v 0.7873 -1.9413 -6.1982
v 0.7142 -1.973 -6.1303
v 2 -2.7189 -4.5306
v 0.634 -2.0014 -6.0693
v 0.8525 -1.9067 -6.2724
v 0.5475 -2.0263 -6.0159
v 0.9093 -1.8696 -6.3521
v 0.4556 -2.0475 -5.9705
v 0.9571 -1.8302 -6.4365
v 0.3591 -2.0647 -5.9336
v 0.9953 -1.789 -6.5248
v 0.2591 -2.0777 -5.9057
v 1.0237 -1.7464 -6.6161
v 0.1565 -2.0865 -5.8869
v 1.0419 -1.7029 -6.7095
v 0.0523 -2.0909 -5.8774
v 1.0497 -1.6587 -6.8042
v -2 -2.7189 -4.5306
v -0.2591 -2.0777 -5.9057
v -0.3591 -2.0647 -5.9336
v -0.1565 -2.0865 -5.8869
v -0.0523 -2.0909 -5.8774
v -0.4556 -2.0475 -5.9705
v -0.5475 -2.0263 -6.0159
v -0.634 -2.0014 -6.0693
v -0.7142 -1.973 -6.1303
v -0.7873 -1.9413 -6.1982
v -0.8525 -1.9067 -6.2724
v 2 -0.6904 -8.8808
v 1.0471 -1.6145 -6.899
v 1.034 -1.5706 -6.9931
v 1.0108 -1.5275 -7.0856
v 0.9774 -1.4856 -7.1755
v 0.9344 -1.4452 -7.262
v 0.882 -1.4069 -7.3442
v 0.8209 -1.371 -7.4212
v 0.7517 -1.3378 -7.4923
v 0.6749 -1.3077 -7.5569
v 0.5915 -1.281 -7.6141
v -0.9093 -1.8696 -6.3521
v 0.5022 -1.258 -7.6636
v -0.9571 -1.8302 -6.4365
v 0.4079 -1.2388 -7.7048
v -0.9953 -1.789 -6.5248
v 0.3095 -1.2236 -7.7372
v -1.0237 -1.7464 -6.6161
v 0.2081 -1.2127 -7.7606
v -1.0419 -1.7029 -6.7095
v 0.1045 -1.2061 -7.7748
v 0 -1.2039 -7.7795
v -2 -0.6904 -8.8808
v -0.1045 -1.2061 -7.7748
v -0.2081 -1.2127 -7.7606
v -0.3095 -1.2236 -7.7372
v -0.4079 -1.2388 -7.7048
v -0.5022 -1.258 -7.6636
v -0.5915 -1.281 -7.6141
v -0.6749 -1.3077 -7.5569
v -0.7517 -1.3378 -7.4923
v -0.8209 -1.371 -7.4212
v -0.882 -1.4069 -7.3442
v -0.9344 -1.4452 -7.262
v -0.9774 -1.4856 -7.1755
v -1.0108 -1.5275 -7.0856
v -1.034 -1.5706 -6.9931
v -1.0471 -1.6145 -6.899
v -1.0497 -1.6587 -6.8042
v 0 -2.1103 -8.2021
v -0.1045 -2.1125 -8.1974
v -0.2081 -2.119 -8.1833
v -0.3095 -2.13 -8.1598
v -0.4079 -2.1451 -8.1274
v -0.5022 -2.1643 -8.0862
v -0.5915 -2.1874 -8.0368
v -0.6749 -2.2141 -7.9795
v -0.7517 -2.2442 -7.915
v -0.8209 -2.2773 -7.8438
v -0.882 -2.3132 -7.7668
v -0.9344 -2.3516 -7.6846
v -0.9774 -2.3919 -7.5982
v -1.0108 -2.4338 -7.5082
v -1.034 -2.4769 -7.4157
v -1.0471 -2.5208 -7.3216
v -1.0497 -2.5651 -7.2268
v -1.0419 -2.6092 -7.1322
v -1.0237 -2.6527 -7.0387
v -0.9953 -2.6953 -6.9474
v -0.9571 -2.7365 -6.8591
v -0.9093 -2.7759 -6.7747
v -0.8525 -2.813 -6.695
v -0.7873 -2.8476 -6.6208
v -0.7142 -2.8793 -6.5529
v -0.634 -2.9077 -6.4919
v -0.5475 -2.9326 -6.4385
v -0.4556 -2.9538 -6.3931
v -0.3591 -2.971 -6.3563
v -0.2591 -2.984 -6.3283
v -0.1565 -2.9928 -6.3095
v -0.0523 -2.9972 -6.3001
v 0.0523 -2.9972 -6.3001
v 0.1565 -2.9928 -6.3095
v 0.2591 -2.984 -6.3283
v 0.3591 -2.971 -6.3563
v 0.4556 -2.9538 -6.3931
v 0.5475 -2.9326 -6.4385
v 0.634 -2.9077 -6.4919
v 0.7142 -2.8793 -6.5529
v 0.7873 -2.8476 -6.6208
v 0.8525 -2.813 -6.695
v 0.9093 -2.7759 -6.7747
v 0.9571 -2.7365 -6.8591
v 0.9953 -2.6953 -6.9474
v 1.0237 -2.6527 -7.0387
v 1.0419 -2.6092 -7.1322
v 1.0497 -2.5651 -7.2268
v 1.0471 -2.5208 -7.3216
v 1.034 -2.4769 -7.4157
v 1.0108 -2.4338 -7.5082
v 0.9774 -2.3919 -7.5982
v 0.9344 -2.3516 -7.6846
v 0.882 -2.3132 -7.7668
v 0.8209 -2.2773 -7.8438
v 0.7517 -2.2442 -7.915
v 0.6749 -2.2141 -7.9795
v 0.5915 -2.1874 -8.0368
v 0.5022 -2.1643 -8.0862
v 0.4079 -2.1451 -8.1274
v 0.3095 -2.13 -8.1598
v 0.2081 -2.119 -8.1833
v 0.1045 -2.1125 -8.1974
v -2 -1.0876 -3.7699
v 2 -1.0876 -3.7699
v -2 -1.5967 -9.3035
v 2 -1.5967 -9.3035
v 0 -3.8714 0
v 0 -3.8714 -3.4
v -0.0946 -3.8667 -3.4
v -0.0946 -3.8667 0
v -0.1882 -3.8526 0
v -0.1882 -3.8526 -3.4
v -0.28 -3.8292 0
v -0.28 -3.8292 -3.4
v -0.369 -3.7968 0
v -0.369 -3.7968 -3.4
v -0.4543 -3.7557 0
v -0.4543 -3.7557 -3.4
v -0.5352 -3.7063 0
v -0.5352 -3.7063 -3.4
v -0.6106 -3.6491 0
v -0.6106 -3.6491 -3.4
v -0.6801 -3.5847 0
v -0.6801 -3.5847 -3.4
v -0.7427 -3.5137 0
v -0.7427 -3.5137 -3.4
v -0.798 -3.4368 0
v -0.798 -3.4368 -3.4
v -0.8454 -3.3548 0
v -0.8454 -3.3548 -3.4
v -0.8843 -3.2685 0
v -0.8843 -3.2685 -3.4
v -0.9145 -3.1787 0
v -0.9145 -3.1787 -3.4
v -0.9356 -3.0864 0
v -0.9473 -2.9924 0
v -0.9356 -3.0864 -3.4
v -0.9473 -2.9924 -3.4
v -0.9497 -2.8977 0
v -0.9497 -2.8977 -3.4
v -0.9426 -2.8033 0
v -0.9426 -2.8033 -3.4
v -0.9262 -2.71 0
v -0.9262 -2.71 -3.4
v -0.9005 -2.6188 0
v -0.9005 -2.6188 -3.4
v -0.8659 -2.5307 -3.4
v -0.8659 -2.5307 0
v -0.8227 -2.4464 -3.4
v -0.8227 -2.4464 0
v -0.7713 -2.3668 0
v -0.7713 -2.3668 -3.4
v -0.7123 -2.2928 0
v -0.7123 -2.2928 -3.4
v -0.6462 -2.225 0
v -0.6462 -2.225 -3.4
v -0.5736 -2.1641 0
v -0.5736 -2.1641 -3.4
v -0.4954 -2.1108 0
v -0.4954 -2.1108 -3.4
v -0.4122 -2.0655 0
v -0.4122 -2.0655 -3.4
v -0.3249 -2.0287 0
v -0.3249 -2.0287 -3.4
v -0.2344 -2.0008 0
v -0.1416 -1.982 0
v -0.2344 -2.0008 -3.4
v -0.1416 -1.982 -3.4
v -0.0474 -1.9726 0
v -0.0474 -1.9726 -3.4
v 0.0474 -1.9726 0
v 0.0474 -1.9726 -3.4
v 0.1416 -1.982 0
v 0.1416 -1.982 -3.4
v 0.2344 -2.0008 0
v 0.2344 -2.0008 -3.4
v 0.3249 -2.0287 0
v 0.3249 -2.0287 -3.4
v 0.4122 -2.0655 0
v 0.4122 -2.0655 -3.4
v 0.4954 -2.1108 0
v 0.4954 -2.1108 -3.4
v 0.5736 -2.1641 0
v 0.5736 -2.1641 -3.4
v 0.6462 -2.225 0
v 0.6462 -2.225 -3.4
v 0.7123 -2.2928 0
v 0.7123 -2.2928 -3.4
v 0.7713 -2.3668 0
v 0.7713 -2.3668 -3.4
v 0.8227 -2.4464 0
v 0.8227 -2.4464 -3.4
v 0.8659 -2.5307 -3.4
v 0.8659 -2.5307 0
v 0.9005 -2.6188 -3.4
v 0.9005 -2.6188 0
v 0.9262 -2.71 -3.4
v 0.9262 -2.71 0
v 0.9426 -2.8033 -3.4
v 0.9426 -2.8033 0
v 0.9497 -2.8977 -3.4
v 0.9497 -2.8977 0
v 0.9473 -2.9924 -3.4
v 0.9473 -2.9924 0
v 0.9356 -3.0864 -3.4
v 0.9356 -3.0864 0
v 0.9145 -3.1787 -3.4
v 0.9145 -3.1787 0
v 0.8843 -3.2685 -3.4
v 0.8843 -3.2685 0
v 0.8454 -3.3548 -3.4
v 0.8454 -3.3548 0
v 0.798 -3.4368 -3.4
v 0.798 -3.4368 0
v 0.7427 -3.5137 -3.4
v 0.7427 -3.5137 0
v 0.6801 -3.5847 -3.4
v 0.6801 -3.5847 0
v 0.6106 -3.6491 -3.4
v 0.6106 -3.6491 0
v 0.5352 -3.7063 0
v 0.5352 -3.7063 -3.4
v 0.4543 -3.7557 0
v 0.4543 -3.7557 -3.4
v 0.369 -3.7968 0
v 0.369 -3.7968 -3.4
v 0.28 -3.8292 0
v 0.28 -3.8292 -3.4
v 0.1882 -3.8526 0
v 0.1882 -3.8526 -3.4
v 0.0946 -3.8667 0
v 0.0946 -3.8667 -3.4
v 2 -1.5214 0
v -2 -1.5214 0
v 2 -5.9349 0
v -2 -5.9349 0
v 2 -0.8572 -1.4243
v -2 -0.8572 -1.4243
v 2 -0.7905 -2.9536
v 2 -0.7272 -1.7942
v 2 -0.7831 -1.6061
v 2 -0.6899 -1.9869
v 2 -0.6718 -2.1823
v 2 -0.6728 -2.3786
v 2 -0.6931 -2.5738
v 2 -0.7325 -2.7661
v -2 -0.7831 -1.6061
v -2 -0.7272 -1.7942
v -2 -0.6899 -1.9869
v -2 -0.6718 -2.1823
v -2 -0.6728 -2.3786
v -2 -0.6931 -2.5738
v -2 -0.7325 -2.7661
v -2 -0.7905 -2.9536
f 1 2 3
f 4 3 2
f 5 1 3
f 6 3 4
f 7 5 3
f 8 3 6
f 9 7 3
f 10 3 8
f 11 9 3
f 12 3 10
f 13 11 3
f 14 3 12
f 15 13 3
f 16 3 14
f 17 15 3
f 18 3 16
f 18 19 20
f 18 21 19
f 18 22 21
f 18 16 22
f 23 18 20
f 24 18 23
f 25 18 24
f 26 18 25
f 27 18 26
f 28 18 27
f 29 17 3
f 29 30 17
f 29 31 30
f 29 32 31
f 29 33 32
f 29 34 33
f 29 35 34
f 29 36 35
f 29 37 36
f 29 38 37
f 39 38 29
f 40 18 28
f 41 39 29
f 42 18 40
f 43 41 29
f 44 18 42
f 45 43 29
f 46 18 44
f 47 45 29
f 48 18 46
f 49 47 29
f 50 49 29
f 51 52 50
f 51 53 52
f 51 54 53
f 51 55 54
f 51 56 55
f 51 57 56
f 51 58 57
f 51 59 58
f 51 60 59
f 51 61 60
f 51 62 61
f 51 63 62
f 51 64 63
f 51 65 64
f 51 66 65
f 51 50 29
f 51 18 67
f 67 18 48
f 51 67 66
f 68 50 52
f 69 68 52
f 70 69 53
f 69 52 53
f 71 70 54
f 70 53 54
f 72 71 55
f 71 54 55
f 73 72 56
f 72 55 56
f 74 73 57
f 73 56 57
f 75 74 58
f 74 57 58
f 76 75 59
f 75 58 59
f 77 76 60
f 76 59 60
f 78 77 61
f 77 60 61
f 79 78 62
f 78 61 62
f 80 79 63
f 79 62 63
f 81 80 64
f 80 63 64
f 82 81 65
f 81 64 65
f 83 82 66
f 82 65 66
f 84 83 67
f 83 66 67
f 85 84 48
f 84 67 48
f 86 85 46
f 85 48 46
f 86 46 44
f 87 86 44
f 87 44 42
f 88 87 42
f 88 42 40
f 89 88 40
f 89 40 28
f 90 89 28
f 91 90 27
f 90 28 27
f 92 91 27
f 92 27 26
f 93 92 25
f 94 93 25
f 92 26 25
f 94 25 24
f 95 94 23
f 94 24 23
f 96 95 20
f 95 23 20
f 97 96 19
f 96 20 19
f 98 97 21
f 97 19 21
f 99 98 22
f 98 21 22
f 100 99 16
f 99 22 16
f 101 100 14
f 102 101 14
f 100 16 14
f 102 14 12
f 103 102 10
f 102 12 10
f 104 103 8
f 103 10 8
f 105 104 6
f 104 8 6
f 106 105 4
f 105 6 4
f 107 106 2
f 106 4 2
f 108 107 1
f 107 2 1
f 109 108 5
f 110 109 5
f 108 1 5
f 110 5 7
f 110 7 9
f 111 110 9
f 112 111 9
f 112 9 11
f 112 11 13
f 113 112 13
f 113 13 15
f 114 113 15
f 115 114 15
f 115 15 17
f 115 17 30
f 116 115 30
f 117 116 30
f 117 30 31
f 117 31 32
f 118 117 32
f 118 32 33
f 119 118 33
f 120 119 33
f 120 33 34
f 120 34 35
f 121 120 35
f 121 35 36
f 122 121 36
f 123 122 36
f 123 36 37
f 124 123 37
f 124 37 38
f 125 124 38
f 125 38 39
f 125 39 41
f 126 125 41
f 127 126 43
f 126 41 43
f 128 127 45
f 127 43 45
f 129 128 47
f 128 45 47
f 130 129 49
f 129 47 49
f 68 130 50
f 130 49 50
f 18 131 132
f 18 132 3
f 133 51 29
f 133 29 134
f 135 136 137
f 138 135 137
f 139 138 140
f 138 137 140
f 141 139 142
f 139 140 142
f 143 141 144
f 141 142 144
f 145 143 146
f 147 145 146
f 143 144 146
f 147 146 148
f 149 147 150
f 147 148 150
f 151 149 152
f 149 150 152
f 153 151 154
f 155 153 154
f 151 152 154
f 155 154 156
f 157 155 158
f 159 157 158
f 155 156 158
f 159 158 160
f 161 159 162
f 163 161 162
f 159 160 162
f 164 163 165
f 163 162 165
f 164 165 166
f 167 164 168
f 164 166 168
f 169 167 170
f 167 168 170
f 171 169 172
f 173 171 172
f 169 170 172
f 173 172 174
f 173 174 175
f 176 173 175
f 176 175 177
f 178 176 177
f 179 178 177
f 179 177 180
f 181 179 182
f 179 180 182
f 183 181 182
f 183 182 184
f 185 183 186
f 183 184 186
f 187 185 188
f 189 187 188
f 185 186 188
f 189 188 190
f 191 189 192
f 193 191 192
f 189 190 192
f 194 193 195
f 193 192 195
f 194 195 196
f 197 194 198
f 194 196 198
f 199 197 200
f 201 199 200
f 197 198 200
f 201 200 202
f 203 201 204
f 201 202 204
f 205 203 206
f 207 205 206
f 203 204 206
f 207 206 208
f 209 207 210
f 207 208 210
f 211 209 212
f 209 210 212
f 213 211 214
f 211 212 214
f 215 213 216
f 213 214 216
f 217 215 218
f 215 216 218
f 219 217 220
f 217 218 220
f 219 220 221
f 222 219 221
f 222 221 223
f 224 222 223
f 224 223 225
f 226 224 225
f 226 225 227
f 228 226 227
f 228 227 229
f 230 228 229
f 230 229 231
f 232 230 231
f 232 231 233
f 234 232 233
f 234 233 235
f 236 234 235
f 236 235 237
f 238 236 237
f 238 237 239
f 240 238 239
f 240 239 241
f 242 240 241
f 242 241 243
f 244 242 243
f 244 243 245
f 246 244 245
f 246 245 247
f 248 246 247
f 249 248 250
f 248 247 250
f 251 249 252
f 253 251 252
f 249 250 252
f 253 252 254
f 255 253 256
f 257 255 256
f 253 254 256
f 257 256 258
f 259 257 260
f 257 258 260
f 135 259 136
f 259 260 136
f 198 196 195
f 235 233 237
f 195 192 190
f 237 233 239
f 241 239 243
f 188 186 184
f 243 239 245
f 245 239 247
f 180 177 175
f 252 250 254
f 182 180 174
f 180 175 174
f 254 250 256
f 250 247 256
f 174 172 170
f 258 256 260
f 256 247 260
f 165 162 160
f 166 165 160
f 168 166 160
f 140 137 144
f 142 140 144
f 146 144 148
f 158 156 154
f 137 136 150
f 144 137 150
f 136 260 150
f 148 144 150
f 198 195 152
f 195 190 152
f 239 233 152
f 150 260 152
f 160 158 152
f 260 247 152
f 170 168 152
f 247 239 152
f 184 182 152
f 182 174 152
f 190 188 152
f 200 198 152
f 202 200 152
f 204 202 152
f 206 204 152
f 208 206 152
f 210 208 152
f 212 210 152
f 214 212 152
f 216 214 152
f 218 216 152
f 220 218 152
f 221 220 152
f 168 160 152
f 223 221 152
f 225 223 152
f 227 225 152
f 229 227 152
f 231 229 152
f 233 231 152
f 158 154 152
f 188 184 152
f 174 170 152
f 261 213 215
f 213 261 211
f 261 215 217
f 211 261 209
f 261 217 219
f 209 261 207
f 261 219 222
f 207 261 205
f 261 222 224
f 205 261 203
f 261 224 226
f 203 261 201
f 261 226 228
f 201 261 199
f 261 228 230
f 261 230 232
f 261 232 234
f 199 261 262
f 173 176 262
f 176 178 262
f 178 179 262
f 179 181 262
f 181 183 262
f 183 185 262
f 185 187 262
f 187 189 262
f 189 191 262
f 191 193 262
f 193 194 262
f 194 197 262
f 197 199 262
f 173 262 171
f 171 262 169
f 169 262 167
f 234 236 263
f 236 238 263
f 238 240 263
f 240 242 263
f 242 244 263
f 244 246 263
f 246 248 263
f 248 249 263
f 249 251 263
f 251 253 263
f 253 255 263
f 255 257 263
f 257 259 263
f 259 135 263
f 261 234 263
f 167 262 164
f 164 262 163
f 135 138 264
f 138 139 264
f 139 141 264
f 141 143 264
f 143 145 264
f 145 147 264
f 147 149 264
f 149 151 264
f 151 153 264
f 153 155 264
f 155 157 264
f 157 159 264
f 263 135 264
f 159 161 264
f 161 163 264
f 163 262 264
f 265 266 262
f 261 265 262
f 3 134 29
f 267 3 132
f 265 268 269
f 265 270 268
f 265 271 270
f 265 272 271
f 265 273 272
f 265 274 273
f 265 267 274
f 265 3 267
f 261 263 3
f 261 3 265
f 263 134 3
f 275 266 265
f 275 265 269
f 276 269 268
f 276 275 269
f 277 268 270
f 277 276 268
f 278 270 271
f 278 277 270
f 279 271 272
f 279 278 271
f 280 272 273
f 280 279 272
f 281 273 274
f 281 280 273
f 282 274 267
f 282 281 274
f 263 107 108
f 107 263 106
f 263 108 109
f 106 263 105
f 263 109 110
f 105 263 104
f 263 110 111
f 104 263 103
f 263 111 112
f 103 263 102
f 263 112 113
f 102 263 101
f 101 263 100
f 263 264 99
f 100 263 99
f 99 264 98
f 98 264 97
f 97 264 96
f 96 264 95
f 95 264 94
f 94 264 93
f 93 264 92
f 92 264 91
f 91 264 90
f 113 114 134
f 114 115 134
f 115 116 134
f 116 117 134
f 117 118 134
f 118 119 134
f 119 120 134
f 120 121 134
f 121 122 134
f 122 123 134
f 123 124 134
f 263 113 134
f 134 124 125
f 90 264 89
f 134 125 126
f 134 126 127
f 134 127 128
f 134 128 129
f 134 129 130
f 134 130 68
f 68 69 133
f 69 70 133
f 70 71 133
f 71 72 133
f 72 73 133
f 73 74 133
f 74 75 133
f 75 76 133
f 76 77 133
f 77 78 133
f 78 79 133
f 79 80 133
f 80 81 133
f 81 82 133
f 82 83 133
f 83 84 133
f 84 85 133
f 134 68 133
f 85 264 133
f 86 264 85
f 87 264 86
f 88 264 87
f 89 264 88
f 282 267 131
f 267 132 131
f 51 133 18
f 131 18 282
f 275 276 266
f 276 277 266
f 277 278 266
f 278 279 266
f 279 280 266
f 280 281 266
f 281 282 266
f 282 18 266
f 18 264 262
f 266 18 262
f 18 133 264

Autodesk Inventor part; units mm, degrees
ref_plane "YZ Plane" through (0, 0, 0) normal (1, 0, 0) x (0, 1, 0)
ref_plane "XZ Plane" through (0, 0, 0) normal (0, 1, 0) x (-1, 0, 0)
ref_plane "XY Plane" through (0, 0, 0) normal (0, 0, 1) x (1, 0, 0)
sketch "Skizze1" plane through (0, 0, 0) normal (1, 0, 0) x (0, 1, 0)
  line L0 (-1.5214, 0) -> (-5.9349, 0)
  line L1 (-5.9349, 0) -> (-1.5967, -9.3035)
  line L2 (0, -3.2627) -> (-1.5214, 0)
  line L3 (0, -3.2627) -> (-2.7189, -4.5306)
  line L4 (-2.7189, -4.5306) -> (-0.6904, -8.8808)
  line L5 (-0.6904, -8.8808) -> (-1.5967, -9.3035)
  line L6 (0, 1.8607) -> (0, -11.1642) projected
  point P0 (0, 0)
  dimension "d0" = 65
  dimension "d32" = 1
  dimension "d33" = 3
  dimension "d35" = 3.6
  dimension "d36" = 8.4
extrude "Extrusion1" add sketch "Skizze1" along normal mid plane 4
sketch "Skizze2" plane through (-2, -5.9349, 0) normal (0, 0, 1) x (1, 0, 0)
  line L0 (0, 0) -> (4, 0) projected
  line L1 (4, 4.4135) -> (4, 0) projected
  line L2 (4, 4.4135) -> (0, 4.4135) projected
  line L3 (0, 0) -> (0, 4.4135) projected
  line L4 (0, 4.3383) -> (0, 0) construction
  point P0 (2, 5.9349)
  point P1 (0, 4.7343)
  point P2 (2, 3.0135)
  dimension "d5" = 2
  dimension "d25" = 1.4
hole "Bohrung1" at (0, -2.9214, 0) direction (0, 0, -1) diameter 1.9 depth 3.4
sketch "Skizze3" plane through (-2, -1.8641, -8.7299) normal (0, -0.9063078, -0.4226183) x (1, 0, 0)
  line L0 (4, 9.6324) -> (4, -0.6329) projected
  line L1 (0, 9.6324) -> (4, 9.6324) projected
  line L2 (0, -0.6329) -> (0, 9.6324) projected
  line L3 (0, -0.6329) -> (4, -0.6329) projected
  point P0 (2, 1.6324)
  dimension "d26" = 2
  dimension "d29" = 8
hole "Bohrung2" at (0, -2.554, -7.2505) direction (0, 0.9063078, 0.4226183) diameter 2.1 end through all
chamfer "Fase1" distance 1.2 angle 45 1 edges at (0, 0, -3.2627)
fillet "Rundung1" radius 2 1 edges at (0, -0.5071, -2.1751)
properties part number "Ballsensor Platinenwinkel" material "PC/ABS-Kunststoff"
